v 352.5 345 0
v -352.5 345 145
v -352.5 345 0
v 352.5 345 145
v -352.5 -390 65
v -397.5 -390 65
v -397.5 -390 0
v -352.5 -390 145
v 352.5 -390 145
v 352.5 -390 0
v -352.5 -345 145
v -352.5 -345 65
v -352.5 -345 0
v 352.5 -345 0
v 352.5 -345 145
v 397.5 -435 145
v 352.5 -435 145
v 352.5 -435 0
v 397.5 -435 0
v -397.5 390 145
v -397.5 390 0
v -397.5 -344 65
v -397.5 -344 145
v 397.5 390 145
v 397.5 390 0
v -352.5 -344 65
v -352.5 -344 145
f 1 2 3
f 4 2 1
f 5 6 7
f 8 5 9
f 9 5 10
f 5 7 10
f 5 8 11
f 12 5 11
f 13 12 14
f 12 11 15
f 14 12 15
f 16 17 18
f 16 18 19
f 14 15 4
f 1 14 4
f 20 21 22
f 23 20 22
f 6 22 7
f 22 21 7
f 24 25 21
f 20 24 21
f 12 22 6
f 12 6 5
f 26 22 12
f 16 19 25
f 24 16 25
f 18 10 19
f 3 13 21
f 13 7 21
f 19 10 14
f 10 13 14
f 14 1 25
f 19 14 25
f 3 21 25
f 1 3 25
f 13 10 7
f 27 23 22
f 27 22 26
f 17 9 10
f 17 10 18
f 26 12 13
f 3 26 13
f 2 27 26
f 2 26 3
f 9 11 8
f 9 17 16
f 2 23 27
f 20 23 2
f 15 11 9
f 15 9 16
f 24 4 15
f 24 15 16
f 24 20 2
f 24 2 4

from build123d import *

# Parameters (mm, degrees)
F1_DEPTH = 145
F2_W     = 705
F2_H     = 690
F3_DEPTH = 145.001
F4_W     = 45
F4_H     = 46
F5_DEPTH = 80


with BuildPart() as f1:
    # F0 (on Top) → F1 (new body)
    with BuildSketch(Plane.XY):
        Polygon((397.5, 390), (-397.5, 390), (-397.5, -390), (352.5, -390), (352.5, -435), (397.5, -435), (397.5, -390), align=None)
    extrude(amount=F1_DEPTH)

    # F2 (on face) → F3 (cut, through all)
    with BuildSketch(Plane.XY.offset(145)):
        Rectangle(F2_W, F2_H)
    extrude(amount=-F3_DEPTH, mode=Mode.SUBTRACT)

    # F4 (on face) → F5 (cut)
    with BuildSketch(Plane.XY.offset(145)):
        with Locations((-375, -367)):
            Rectangle(F4_W, F4_H)
    extrude(amount=-F5_DEPTH, mode=Mode.SUBTRACT)


solid = f1.part
